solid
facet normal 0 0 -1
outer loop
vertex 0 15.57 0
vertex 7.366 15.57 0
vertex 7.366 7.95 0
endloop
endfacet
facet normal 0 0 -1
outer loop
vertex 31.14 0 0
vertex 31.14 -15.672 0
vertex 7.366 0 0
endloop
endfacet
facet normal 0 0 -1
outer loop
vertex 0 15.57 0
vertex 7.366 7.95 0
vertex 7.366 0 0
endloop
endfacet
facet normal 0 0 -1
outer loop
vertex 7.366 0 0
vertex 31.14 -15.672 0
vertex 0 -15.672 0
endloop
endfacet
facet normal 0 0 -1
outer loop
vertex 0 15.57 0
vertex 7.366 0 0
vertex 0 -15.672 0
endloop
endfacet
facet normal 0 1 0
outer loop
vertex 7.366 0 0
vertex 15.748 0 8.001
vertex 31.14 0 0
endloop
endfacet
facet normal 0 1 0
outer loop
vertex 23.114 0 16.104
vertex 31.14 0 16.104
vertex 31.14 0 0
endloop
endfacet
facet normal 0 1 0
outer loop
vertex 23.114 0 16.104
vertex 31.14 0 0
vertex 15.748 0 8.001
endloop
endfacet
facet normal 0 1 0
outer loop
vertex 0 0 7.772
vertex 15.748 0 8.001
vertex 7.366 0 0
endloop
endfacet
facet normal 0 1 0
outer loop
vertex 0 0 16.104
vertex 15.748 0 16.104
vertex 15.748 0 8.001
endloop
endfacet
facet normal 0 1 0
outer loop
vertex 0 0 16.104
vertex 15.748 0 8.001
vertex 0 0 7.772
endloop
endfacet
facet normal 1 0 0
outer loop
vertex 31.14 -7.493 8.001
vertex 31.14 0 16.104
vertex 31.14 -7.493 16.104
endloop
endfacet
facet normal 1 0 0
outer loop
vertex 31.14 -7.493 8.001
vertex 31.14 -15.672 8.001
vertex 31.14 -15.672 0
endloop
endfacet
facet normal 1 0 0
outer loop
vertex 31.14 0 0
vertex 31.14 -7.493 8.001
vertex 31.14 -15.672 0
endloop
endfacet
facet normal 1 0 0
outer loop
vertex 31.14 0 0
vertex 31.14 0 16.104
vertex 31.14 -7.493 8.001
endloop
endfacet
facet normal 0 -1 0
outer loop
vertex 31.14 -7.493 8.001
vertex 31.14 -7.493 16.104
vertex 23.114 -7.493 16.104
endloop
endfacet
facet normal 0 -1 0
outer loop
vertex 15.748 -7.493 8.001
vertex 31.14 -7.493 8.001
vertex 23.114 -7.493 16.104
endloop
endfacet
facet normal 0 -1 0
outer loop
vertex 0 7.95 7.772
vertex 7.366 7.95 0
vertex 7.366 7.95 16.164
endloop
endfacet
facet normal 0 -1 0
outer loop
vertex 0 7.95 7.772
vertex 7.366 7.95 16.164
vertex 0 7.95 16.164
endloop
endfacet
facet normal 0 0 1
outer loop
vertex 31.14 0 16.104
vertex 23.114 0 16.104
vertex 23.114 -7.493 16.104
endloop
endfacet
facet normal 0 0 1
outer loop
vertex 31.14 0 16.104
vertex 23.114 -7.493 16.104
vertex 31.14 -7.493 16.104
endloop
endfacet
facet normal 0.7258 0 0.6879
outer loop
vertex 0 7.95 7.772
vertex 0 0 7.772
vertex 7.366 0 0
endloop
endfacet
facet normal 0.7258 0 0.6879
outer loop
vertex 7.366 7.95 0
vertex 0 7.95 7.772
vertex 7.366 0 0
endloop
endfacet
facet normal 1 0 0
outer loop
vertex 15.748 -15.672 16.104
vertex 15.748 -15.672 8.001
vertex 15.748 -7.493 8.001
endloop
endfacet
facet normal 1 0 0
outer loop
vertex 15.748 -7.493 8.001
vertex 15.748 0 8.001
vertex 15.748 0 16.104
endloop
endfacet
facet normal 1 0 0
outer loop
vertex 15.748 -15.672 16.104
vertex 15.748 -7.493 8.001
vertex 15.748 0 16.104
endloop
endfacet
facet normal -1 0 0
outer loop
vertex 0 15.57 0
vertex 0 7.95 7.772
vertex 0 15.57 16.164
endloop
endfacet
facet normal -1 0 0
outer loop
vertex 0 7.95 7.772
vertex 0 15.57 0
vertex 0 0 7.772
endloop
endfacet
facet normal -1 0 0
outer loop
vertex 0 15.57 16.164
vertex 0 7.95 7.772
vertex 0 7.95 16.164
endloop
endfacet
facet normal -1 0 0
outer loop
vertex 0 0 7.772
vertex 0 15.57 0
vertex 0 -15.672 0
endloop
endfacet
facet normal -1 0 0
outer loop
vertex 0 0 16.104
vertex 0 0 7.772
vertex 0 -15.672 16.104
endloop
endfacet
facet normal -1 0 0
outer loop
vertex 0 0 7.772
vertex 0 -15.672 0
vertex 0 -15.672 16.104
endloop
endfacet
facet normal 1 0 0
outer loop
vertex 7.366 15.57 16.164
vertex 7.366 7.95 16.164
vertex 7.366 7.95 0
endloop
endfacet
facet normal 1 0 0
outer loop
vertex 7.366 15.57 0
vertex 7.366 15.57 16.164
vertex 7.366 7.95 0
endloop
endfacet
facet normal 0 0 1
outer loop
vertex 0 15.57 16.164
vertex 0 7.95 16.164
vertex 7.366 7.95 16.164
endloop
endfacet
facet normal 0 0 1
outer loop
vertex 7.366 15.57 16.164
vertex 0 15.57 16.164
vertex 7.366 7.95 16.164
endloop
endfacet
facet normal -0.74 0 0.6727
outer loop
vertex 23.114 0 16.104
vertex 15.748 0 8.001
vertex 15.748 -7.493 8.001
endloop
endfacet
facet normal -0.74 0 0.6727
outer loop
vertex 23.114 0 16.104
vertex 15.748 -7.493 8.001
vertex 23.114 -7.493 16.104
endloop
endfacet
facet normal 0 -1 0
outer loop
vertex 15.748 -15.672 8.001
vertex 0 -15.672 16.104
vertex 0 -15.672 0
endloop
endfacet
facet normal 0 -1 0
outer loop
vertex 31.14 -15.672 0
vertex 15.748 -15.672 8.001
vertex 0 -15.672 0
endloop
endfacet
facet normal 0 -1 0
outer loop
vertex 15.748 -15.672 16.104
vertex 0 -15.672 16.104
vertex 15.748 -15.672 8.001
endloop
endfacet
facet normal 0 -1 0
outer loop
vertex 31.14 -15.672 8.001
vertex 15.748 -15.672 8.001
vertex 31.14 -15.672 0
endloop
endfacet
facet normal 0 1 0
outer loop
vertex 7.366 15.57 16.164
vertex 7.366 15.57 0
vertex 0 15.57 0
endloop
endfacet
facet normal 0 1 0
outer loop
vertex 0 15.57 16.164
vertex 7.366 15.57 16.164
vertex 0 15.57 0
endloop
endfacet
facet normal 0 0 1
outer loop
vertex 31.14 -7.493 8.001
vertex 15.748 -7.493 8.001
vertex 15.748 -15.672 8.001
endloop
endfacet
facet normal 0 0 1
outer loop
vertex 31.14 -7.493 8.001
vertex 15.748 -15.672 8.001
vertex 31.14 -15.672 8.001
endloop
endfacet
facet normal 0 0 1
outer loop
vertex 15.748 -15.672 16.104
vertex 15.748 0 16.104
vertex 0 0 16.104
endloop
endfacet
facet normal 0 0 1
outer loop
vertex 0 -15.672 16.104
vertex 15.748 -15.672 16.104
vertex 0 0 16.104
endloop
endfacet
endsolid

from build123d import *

# Parameters (mm, degrees)
F0_W     = 15.3924
F0_H     = 8.001
F1_DEPTH = 15.6718
F3_DEPTH = 7.493
F5_DEPTH = 7.9502
F7_DEPTH = 7.62


with BuildPart() as f1:
    # F0 (on Front) → F1 (new body)
    with BuildSketch(Plane.XZ):
        with Locations((23.4442, 4.0005)):
            Rectangle(F0_W, F0_H)
        Polygon((0, 16.1036), (0, 0), (15.748, 0), (15.748, 8.001), (15.748, 16.1036), align=None)
    extrude(amount=F1_DEPTH)

    # F2 (on face) → F3 (join)
    with BuildSketch(Plane(origin=(0, 0, 0), x_dir=(-1, 0, 0), z_dir=(0, 1, 0))):
        Polygon((-31.1404, 16.1036), (-31.1404, 8.001), (-15.748, 8.001), (-23.113546893, 16.1036), align=None)
    extrude(amount=-F3_DEPTH)

    # F4 (on face) → F5 (join)
    with BuildSketch(Plane(origin=(0, 0, 0), x_dir=(-1, 0, 0), z_dir=(0, 1, 0))):
        Polygon((-7.366, 0), (0, 0), (0, 7.7724), align=None)
    extrude(amount=F5_DEPTH)

    # F6 (on face) → F7 (join)
    with BuildSketch(Plane(origin=(0, 7.9502, 0), x_dir=(-1, 0, 0), z_dir=(0, 1, 0))):
        Polygon((-7.366, 0), (0, 0), (0, 7.7724), align=None)
        Polygon((-7.366, 16.163635999), (-7.366, 0), (0, 7.7724), (0, 16.163635999), align=None)
    extrude(amount=F7_DEPTH)


solid = f1.part
